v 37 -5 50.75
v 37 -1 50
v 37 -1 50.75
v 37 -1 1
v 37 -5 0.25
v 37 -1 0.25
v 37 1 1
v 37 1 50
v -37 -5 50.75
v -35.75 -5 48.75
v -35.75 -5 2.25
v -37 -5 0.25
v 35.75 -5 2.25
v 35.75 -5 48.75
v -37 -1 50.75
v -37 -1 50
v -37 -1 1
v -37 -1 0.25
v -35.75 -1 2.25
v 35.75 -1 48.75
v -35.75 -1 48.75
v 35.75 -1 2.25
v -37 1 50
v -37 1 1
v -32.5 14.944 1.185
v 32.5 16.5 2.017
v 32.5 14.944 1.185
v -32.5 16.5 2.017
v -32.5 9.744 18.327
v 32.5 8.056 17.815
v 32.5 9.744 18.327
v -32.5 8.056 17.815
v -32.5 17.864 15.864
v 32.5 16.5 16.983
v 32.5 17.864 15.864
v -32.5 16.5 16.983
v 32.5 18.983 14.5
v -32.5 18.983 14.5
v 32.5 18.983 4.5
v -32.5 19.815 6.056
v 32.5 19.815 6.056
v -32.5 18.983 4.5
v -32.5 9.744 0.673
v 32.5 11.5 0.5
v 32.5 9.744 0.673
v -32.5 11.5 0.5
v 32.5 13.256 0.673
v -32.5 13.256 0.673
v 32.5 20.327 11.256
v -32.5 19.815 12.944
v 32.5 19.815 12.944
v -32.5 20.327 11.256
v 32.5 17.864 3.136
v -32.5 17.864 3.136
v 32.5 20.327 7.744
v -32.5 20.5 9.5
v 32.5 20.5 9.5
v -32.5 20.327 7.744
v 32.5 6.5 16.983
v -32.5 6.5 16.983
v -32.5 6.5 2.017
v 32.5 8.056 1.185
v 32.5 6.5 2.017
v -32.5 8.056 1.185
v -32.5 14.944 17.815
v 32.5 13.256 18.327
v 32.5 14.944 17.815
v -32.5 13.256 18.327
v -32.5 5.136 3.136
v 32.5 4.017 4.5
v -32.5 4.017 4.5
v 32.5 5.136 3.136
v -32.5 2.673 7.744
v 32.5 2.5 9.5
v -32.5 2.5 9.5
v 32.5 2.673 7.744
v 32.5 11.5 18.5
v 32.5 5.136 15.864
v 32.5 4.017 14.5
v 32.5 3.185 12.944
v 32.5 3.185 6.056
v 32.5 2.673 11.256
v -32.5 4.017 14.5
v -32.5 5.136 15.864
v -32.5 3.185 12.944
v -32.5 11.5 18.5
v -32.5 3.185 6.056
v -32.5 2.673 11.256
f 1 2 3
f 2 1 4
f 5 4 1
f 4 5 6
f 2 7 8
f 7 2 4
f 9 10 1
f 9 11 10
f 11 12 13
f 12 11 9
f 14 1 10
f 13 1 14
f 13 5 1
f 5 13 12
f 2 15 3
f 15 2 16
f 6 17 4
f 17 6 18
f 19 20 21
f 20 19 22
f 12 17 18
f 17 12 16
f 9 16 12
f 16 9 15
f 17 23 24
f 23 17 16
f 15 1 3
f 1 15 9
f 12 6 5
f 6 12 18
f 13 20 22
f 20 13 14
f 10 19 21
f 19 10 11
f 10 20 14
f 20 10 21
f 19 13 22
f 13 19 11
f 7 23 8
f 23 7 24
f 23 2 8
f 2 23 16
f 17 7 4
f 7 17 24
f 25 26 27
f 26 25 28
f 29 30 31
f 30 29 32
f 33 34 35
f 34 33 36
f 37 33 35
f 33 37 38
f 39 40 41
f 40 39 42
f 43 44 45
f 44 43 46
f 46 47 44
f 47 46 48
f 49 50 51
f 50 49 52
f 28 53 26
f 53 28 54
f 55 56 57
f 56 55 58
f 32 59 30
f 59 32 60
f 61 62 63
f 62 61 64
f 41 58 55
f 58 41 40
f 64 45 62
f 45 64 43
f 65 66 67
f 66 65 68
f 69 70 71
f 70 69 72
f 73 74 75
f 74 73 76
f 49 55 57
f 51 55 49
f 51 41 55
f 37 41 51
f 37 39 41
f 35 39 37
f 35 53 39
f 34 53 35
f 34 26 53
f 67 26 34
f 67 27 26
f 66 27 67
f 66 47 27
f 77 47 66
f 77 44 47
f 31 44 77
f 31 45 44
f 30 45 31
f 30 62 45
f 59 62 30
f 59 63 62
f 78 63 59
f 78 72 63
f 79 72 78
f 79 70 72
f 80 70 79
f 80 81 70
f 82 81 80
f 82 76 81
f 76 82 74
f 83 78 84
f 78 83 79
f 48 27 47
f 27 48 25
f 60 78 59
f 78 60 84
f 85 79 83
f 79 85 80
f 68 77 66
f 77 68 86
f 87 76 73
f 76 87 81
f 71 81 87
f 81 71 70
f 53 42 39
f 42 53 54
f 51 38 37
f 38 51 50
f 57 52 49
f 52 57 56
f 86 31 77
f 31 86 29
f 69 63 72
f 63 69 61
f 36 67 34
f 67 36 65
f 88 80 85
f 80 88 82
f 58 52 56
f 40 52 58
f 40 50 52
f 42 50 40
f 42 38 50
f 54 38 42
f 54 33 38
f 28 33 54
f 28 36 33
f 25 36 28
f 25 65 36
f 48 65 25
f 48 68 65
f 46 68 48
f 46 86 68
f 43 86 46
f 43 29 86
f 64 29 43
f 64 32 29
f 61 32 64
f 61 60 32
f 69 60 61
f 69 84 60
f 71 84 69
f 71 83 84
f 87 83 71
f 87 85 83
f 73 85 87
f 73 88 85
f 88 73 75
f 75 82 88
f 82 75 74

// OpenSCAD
// file: akkum18650.scad
echo("Ропацкий Евгений Влдаимирович");
d_akkum = 19;
h_akkum = 65;

akkum18650_set();

module akkum18650_set() {
    translate([0, -d_akkum/2-1, d_akkum/2+1])
    rotate([0, 90, 0])
    akkum18650();
    
    translate([0, d_akkum/2+1, d_akkum/2+1])
    rotate([0, 90, 0])
    akkum18650();

    translate([-33, -10, 0])
    import ("flexbatter18650x2.stl");

}
module akkum18650() {
    
    color("purple")
    cylinder(d=18, h=h_akkum, $fn=32, center = true);
    
}
// main file
use <akkum18650.scad>

echo("Работа Ропацкого Евгения!");


fitnes_frame = 4;

w_back = 70;
h_back = 45;
thickness_back = 1;
thickness_walls = 2;
thickness_bottom = 2;
h_walls = 4;
gap_backlight = 1.5;
build_frame();
d_akkum = 19;
h_akkum = 65;



////rotate([90, 0, 0])
//translate([0, 0, 4])
//backlight();
//kit_frame();
//akkum18650();

module build_frame() {
    translate([0, 0, h_back/2+2*gap_backlight])
    rotate ([90, 0, 0])
    kit_frame();
    translate([0, d_akkum/2+thickness_bottom, d_akkum/2])
    rotate ([0, 90, 0])
    akkum18650();
    
}

module kit_frame(){
bottom();
color("blue")
translate([0, 0, h_walls/2+thickness_bottom/2])
walls();
}

module walls(){
    difference(){
        cube([w_back + 2*thickness_walls, h_back+2*thickness_walls + gap_backlight, h_walls],center = true);
        color ("red")
        cube([w_back+gap_backlight, h_back+gap_backlight, h_walls +1],center = true);
    }
}
module bottom(){
cube([w_back + 2*thickness_walls, h_back+2*thickness_walls, thickness_bottom],center = true);
}

module backlight() {
    color("lightgreen")
    cube([w_back, h_back, thickness_back], center = true);
}
